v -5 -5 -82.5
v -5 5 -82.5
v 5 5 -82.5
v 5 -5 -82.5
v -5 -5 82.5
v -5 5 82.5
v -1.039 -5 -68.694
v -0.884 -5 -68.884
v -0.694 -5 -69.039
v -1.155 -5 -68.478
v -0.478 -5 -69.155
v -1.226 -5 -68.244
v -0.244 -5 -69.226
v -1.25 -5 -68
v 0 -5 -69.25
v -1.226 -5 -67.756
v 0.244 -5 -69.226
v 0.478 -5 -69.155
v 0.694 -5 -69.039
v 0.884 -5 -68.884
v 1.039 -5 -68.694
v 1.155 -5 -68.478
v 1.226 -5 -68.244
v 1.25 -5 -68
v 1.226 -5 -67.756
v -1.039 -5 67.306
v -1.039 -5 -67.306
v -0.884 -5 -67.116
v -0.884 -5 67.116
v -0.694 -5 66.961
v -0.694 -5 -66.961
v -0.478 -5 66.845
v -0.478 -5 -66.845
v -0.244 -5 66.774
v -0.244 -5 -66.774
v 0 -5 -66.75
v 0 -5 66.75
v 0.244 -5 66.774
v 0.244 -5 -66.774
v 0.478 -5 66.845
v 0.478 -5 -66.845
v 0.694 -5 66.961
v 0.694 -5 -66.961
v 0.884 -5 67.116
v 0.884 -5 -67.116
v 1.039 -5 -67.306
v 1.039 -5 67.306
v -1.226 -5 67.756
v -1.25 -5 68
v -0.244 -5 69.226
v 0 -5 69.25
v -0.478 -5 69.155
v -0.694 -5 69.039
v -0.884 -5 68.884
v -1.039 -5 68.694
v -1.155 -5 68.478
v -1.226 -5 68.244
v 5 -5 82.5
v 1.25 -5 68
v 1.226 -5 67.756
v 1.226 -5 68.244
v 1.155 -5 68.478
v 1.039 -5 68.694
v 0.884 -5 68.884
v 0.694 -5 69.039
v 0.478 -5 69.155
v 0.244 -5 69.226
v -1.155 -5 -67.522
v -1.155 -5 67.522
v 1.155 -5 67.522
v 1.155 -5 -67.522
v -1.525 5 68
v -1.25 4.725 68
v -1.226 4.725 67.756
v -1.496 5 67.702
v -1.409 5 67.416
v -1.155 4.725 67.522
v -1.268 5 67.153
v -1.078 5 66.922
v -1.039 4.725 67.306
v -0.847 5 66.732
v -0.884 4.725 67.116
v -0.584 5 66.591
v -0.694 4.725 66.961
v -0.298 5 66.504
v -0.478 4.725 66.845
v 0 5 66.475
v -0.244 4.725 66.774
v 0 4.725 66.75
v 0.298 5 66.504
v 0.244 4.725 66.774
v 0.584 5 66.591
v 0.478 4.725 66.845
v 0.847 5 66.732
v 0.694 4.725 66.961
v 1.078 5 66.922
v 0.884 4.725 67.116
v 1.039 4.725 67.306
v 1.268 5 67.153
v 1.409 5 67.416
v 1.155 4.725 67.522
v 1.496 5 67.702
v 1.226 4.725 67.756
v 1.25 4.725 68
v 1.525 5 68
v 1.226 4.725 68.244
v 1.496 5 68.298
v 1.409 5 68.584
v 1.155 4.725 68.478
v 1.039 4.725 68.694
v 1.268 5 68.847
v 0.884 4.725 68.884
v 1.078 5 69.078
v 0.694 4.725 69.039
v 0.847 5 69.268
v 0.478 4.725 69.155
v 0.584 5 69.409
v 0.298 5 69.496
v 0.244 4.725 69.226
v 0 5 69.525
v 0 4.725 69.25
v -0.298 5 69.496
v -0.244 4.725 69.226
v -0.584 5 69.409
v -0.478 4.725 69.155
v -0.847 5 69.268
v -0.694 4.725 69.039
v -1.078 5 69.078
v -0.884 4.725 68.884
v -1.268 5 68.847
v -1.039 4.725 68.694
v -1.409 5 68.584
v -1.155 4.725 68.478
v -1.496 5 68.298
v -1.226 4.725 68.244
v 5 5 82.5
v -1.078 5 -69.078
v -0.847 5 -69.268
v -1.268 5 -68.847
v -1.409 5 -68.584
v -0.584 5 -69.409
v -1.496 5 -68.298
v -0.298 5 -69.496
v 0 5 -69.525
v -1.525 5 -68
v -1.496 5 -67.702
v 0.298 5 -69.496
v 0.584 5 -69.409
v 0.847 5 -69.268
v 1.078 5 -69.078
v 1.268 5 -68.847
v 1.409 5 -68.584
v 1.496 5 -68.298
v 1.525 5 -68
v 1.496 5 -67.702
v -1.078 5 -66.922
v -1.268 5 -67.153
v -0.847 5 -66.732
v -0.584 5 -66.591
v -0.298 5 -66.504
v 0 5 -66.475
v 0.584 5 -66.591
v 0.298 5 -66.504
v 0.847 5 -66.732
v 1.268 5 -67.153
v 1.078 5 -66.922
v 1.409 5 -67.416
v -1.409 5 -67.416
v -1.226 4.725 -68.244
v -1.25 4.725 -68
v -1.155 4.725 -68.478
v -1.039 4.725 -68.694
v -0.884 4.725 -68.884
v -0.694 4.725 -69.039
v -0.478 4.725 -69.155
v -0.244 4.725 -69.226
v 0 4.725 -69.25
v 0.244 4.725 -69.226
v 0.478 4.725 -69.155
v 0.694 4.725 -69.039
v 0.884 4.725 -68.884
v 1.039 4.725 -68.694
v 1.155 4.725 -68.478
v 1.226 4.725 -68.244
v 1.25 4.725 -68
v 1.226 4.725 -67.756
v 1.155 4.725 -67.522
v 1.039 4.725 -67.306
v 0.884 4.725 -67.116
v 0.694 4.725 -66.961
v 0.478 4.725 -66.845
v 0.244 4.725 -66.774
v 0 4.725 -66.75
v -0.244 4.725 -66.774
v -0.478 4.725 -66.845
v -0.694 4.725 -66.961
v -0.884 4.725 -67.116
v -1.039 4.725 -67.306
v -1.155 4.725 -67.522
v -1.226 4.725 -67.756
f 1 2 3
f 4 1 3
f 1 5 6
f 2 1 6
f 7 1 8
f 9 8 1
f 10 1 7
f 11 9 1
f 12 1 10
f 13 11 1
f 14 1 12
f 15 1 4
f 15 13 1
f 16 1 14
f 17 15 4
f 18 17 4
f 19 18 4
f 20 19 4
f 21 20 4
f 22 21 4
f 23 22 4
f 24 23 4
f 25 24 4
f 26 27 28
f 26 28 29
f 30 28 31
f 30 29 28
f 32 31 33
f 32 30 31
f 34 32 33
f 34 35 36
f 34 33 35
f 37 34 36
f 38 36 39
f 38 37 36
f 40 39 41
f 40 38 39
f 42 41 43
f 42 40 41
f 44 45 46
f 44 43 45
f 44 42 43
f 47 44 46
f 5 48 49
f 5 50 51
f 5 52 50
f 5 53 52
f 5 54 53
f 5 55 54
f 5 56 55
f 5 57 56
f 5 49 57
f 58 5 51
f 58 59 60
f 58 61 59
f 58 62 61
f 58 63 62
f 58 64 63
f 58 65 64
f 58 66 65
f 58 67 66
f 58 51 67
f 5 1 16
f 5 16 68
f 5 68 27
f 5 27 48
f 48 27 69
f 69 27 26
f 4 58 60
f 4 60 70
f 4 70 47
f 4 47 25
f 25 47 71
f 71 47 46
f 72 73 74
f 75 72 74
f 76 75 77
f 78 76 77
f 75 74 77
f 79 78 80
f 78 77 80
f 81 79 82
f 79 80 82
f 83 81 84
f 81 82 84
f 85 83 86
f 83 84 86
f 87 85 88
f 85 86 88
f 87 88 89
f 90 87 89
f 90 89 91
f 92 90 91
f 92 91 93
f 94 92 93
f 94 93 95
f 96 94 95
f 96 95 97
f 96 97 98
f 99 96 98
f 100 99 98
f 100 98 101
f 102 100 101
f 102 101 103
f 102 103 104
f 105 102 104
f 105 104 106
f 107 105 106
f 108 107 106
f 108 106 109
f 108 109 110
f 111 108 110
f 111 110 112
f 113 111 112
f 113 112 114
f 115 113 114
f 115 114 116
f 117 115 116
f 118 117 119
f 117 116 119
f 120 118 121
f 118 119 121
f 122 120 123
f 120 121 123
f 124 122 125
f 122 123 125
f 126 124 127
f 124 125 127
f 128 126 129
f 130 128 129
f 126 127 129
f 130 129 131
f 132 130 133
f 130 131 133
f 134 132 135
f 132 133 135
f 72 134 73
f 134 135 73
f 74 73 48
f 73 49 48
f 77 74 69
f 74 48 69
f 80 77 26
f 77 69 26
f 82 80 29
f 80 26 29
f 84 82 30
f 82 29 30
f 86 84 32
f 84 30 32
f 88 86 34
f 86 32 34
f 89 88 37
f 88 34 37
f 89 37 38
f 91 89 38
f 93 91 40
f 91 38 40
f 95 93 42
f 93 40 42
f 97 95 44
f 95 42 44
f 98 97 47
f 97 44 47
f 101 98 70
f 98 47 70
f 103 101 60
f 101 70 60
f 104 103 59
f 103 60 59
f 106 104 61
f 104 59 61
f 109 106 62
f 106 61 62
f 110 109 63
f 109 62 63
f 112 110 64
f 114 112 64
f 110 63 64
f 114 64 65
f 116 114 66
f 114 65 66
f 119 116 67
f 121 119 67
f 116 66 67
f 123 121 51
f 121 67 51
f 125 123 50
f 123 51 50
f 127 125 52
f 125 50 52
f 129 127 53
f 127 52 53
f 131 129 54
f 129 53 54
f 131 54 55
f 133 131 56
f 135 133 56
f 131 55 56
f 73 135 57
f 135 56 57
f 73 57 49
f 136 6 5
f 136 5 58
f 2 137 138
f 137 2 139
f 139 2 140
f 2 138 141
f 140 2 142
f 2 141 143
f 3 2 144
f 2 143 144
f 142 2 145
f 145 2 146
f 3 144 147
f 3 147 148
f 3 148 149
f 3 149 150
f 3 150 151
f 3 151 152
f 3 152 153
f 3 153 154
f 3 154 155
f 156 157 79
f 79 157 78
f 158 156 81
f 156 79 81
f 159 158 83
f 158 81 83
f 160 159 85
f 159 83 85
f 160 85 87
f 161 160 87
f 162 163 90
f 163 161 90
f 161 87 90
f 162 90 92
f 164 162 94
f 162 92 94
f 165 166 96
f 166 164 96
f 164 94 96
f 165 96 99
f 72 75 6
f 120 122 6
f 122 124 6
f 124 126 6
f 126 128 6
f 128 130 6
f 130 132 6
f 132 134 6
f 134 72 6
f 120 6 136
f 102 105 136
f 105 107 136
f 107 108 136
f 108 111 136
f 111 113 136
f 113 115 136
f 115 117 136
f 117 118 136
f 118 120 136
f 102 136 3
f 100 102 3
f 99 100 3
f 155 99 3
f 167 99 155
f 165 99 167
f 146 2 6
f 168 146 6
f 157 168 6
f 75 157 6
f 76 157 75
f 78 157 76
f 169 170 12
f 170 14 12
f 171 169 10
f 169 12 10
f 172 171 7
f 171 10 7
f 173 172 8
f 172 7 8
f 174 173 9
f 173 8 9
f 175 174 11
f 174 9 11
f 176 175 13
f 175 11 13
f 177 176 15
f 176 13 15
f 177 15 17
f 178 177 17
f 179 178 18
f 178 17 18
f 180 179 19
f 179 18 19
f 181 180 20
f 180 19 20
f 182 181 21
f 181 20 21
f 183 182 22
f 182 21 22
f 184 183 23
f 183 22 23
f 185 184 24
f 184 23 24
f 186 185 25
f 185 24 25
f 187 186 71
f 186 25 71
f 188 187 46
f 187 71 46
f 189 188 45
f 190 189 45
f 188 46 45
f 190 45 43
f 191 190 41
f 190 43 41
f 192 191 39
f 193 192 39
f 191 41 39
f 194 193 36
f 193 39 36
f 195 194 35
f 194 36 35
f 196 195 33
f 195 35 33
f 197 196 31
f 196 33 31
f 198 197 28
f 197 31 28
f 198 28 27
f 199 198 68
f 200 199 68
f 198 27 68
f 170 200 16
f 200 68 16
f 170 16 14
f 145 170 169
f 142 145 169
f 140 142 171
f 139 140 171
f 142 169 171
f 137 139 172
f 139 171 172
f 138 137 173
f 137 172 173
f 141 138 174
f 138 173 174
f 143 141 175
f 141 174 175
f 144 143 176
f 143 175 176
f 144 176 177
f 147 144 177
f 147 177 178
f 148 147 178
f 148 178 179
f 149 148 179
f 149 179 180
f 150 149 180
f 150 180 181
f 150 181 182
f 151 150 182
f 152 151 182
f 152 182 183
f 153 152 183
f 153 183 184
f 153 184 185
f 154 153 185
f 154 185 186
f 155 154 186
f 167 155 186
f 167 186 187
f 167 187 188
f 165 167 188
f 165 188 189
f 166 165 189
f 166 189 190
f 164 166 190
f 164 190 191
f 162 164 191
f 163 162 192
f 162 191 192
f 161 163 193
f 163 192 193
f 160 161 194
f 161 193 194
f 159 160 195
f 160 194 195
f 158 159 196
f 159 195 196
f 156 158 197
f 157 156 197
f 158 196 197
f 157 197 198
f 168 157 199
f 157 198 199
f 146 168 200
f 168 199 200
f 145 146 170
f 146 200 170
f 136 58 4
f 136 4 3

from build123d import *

# Parameters (mm, degrees)
ESQUISSE1_W                     = 10
ESQUISSE1_H                     = 10
BOSS_EXTRU_1_DEPTH              = 82.5
TROU_TARAUD_M3X0_52_D           = 2.5
TROU_TARAUD_M3X0_52_CSINK_D     = 3.05
TROU_TARAUD_M3X0_52_CSINK_ANGLE = 90


with BuildPart() as part:
    # Esquisse1 → Boss.-Extru.1 (new, symmetric)
    with BuildSketch(Plane.XY):
        Rectangle(ESQUISSE1_W, ESQUISSE1_H)
    extrude(amount=BOSS_EXTRU_1_DEPTH, both=True)

    # Trou taraudé M3x0.52 (through all)
    with Locations(Plane(origin=(0, 5, 0), x_dir=(1, 0, 0), z_dir=(0, 1, 0))):
        with Locations((0, 68), (0, -68)):
            CounterSinkHole(TROU_TARAUD_M3X0_52_D / 2, TROU_TARAUD_M3X0_52_CSINK_D / 2, counter_sink_angle=TROU_TARAUD_M3X0_52_CSINK_ANGLE)


solid = part.part
